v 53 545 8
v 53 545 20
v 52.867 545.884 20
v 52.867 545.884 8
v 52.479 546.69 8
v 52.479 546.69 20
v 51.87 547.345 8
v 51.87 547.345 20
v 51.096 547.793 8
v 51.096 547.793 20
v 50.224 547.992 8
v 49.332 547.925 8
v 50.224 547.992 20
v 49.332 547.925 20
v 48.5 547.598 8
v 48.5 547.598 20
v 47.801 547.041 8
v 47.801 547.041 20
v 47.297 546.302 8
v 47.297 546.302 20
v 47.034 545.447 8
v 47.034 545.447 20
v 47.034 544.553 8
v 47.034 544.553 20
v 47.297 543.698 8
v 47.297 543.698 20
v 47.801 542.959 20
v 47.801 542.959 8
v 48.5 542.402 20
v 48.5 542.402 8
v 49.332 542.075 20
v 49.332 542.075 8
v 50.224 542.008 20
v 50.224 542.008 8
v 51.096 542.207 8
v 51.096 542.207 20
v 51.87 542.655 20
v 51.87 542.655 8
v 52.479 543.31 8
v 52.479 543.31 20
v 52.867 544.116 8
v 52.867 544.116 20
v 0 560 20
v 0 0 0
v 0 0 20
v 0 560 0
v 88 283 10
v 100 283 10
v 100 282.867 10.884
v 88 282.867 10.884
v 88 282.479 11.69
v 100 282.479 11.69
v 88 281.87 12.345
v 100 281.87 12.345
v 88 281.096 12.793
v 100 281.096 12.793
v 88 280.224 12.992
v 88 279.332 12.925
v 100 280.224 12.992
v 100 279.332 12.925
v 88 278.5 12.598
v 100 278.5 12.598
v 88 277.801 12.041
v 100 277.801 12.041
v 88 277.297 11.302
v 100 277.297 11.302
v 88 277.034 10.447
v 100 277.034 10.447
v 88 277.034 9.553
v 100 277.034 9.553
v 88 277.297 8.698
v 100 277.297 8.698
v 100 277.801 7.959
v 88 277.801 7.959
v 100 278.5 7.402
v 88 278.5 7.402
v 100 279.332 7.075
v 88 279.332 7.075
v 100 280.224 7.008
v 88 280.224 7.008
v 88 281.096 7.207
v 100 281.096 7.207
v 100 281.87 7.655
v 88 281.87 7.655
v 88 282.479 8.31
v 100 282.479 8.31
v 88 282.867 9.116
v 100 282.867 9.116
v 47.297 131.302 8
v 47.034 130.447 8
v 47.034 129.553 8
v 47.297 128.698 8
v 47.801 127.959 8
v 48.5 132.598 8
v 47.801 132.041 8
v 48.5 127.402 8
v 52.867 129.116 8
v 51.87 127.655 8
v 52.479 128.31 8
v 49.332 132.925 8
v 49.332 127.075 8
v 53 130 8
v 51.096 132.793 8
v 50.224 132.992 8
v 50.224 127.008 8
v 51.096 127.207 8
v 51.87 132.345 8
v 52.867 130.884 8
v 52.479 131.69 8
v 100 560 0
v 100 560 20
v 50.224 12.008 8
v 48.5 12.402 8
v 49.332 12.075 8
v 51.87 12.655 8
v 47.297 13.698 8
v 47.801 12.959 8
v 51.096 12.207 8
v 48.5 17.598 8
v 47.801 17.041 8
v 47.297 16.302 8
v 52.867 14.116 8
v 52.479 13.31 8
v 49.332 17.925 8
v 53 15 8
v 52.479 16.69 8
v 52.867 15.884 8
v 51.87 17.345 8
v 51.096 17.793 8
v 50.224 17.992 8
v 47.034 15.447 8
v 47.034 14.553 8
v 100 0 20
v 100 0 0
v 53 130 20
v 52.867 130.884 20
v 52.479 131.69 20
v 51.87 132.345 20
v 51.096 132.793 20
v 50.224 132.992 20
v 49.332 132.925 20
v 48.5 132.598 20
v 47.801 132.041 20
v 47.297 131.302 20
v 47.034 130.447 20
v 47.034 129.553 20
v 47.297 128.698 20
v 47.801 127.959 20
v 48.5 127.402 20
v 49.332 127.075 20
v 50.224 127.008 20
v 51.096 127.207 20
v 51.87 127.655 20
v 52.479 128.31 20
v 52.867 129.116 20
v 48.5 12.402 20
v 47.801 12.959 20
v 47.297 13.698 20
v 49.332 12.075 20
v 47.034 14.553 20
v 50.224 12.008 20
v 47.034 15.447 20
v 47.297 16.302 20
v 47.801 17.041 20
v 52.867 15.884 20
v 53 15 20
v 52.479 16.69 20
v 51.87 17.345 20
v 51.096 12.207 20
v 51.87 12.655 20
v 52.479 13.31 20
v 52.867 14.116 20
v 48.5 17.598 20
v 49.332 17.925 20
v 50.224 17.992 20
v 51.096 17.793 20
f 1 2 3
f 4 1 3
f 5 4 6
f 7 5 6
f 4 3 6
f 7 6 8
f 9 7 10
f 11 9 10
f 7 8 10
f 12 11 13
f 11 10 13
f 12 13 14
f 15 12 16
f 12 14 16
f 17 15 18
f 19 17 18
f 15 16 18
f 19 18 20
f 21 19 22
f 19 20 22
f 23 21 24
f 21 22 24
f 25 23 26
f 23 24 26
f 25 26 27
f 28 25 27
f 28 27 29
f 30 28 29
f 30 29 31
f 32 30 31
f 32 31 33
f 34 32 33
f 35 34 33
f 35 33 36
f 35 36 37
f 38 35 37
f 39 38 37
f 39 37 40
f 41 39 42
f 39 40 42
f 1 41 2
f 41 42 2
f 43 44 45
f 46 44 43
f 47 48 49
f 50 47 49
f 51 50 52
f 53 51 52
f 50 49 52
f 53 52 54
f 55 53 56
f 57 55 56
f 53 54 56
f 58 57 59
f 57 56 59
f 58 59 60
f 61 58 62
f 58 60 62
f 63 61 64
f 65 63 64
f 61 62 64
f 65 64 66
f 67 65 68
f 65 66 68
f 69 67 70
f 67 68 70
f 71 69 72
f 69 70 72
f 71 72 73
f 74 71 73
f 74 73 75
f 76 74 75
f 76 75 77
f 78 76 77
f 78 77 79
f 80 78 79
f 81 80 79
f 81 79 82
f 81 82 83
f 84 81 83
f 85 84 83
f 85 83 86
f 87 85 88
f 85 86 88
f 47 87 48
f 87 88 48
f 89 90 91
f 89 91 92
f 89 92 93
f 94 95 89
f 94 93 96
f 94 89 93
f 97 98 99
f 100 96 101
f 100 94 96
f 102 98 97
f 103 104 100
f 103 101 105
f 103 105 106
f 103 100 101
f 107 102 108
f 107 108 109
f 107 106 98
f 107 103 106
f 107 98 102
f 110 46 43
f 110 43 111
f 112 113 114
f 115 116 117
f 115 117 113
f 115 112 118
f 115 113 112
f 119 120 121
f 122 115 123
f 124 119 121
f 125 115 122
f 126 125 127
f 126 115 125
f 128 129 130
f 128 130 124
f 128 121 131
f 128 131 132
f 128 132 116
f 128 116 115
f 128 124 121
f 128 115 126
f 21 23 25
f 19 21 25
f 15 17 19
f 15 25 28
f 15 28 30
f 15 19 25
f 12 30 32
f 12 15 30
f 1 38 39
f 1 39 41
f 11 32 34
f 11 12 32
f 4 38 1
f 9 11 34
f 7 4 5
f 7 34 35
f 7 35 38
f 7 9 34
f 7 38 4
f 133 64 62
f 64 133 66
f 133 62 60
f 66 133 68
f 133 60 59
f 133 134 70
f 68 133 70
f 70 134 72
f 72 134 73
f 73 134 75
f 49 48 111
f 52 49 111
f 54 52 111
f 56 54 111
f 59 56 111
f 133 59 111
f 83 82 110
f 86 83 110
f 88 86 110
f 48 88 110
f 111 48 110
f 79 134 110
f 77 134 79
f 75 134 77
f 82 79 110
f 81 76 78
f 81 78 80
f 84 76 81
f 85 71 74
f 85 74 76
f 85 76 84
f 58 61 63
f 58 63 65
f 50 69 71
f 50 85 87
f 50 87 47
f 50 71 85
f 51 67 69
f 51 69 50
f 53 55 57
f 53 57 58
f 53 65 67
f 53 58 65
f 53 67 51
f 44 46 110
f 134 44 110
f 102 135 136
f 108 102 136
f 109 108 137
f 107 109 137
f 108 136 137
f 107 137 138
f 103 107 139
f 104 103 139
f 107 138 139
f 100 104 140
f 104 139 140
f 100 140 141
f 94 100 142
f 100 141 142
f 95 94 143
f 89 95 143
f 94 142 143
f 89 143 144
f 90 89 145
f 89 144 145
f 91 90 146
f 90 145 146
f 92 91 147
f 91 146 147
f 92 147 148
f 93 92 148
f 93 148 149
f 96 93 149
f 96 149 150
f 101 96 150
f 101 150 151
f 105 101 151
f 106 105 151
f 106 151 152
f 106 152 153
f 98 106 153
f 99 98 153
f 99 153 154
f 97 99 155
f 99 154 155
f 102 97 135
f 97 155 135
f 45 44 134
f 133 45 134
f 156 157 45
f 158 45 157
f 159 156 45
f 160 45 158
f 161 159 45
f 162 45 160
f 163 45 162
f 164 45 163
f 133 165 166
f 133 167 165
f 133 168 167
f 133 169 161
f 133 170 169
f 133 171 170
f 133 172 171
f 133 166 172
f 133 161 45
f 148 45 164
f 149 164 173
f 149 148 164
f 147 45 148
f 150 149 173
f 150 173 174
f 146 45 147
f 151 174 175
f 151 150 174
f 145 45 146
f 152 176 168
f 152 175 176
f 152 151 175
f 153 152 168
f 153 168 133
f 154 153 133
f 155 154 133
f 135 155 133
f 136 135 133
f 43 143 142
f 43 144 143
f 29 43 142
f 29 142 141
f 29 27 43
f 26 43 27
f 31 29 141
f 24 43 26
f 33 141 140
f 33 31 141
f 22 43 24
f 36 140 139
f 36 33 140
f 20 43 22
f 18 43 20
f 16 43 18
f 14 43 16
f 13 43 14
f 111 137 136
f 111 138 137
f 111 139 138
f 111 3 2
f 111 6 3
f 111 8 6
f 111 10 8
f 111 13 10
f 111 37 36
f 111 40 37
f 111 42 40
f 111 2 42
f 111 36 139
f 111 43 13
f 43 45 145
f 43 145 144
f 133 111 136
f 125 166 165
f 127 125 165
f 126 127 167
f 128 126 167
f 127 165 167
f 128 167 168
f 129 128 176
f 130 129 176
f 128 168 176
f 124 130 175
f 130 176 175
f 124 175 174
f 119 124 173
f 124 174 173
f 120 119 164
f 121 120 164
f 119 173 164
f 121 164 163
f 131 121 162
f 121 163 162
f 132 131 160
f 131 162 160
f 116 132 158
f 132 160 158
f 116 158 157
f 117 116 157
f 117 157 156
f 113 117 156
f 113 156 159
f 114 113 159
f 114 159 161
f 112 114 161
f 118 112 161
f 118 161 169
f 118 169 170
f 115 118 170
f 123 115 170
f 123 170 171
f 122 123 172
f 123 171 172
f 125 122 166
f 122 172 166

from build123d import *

# Parameters (mm, degrees)
F0_W     = 100
F0_H     = 560
F1_DEPTH = 20
F2_R     = 3
F3_DEPTH = 12
F4_R     = 3
F5_DEPTH = 12
F6_R     = 3
F7_DEPTH = 12
F8_R     = 3
F9_DEPTH = 12


with BuildPart() as f1:
    # F0 (on Top) → F1 (new body)
    with BuildSketch(Plane.XY):
        with Locations((50, 280)):
            Rectangle(F0_W, F0_H)
    extrude(amount=F1_DEPTH)

    # F2 (on face) → F3 (cut)
    with BuildSketch(Plane.XY.offset(20)):
        with Locations((50, 15)):
            Circle(F2_R)
    extrude(amount=-F3_DEPTH, mode=Mode.SUBTRACT)

    # F4 (on face) → F5 (cut)
    with BuildSketch(Plane.XY.offset(20)):
        with Locations((50, 545)):
            Circle(F4_R)
    extrude(amount=-F5_DEPTH, mode=Mode.SUBTRACT)

    # F6 (on face) → F7 (cut)
    with BuildSketch(Plane.XY.offset(20)):
        with Locations((50, 130)):
            Circle(F6_R)
    extrude(amount=-F7_DEPTH, mode=Mode.SUBTRACT)

    # F8 (on face) → F9 (cut)
    with BuildSketch(Plane.YZ.offset(100)):
        with Locations((280, 10)):
            Circle(F8_R)
    extrude(amount=-F9_DEPTH, mode=Mode.SUBTRACT)


solid = f1.part
